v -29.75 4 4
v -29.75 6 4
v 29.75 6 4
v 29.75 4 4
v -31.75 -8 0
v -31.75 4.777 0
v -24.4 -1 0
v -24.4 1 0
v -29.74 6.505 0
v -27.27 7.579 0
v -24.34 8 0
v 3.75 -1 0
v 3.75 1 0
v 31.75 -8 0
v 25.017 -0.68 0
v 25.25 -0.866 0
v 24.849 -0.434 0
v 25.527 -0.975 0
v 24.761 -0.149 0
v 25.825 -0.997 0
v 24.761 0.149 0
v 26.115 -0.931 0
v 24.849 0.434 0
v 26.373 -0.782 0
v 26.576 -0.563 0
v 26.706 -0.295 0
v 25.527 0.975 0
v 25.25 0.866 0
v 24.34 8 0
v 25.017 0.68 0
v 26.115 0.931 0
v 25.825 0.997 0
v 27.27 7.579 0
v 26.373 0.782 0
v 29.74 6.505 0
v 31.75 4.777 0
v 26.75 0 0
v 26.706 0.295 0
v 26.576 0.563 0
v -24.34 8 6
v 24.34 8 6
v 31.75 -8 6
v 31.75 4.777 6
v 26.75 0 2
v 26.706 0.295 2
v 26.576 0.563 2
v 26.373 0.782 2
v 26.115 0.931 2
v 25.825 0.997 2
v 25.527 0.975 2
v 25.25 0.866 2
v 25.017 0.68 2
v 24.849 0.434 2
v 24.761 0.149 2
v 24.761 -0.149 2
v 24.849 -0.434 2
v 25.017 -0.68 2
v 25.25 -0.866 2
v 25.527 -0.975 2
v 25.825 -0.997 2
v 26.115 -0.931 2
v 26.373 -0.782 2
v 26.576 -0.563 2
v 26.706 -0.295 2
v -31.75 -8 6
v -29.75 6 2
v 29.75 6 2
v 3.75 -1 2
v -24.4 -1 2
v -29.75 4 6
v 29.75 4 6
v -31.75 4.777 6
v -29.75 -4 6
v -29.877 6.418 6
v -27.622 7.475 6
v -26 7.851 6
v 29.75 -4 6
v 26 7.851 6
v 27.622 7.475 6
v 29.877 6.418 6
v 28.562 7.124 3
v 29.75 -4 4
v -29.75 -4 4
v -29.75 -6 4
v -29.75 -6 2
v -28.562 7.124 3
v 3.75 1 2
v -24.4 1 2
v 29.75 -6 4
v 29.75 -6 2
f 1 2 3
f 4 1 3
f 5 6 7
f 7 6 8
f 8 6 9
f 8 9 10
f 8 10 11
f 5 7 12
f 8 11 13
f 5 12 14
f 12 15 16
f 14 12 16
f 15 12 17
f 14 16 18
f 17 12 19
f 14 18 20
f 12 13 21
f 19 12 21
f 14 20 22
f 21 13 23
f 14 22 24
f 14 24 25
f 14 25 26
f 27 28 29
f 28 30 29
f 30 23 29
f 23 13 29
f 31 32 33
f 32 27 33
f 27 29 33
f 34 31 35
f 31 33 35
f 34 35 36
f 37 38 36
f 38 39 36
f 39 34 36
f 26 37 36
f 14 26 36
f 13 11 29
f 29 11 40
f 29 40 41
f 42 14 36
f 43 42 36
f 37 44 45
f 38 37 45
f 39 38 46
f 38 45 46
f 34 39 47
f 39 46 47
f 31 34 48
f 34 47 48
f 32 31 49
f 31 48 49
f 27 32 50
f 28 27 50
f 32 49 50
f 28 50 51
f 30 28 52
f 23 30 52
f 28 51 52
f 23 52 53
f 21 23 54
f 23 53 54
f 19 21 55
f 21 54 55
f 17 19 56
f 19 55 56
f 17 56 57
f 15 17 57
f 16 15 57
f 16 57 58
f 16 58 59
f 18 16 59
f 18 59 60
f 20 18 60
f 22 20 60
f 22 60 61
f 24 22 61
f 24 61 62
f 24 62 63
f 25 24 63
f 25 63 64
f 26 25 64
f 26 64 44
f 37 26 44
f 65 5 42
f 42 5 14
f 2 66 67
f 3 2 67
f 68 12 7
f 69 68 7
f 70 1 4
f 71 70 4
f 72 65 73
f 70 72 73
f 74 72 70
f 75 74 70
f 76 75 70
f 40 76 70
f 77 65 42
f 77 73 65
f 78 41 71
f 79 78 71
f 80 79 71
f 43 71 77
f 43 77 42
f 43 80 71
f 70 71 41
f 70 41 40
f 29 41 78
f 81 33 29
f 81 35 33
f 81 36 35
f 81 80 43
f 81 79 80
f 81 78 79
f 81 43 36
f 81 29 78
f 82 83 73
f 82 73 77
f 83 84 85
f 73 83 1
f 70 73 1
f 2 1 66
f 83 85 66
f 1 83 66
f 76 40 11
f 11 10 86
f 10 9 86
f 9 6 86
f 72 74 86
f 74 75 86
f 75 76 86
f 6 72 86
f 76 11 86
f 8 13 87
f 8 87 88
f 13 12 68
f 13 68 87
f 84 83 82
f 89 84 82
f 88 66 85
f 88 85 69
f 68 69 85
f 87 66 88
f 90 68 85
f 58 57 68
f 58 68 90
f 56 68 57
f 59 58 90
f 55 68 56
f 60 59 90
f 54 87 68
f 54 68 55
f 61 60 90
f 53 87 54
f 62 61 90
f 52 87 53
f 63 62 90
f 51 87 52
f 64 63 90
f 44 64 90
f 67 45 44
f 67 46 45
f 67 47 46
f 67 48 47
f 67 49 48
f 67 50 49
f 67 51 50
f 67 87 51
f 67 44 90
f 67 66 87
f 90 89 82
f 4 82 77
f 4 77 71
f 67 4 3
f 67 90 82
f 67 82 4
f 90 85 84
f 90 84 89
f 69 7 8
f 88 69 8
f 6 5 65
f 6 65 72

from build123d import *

# Parameters (mm, degrees)
SKETCH1_W           = 63.5
SKETCH1_H           = 16
BOSS_EXTRUDE1_DEPTH = 2
SKETCH2_W           = 63.5
SKETCH2_H           = 16
SKETCH2_W_2         = 59.5
SKETCH2_H_2         = 12
BOSS_EXTRUDE2_DEPTH = 2
SKETCH4_W           = 63.5
SKETCH4_H           = 16
SKETCH4_W_2         = 59.5
SKETCH4_H_2         = 8
BOSS_EXTRUDE3_DEPTH = 2
SKETCH6_R           = 1
CUT_EXTRUDE2_DEPTH  = 33.985792396
SKETCH7_W           = 28.15
SKETCH7_H           = 2
CUT_EXTRUDE3_DEPTH  = 34.287572756
CUT_EXTRUDE4_DEPTH  = 34.287572756


with BuildPart() as part:
    # Sketch1 → Boss-Extrude1 (new body)
    with BuildSketch(Plane.XY):
        Rectangle(SKETCH1_W, SKETCH1_H)
    extrude(amount=BOSS_EXTRUDE1_DEPTH)

    # Sketch2 → Boss-Extrude2 (add)
    with BuildSketch(Plane.XY.offset(2)):
        Rectangle(SKETCH2_W, SKETCH2_H)
        Rectangle(SKETCH2_W_2, SKETCH2_H_2, mode=Mode.SUBTRACT)
    extrude(amount=BOSS_EXTRUDE2_DEPTH)

    # Sketch4 → Boss-Extrude3 (add)
    with BuildSketch(Plane.XY.offset(4)):
        Rectangle(SKETCH4_W, SKETCH4_H)
        Rectangle(SKETCH4_W_2, SKETCH4_H_2, mode=Mode.SUBTRACT)
    extrude(amount=BOSS_EXTRUDE3_DEPTH)

    # Sketch6 → Cut-Extrude2 (cut, through all)
    with BuildSketch(Plane.XY.offset(2)):
        with Locations((25.75, 0)):
            Circle(SKETCH6_R)
    extrude(amount=-CUT_EXTRUDE2_DEPTH, mode=Mode.SUBTRACT)

    # Sketch7 → Cut-Extrude3 (cut, through all)
    with BuildSketch(Plane(origin=(0, 0, 0), x_dir=(-1, 0, 0), z_dir=(0, 0, -1))):
        with Locations((10.325, 0)):
            Rectangle(SKETCH7_W, SKETCH7_H)
    extrude(amount=-CUT_EXTRUDE3_DEPTH, mode=Mode.SUBTRACT)

    # Sketch8 → Cut-Extrude4 (cut, through all)
    with BuildSketch(Plane(origin=(0, 0, 0), x_dir=(-1, 0, 0), z_dir=(0, 0, -1))):
        with BuildLine():
            add(Edge.make_bspline(
                [(24.340057871, 8), (29.079374102, 7.859454073), (31.75, 4.777235297)],
                knots=[0.087220719, 0.087220719, 0.087220719, 1, 1, 1], degree=2))
            Line((31.75, 4.777235297), (31.75, 8))
            Line((31.75, 8), (24.340057871, 8))
        make_face()
    cut_extrude4 = extrude(amount=-CUT_EXTRUDE4_DEPTH, mode=Mode.SUBTRACT)

    # Mirror1: Cut-Extrude4 across plane
    add(cut_extrude4.mirror(Plane(origin=(0, 0, 0), x_dir=(0, 0, 1), z_dir=(1, 0, 0))), mode=Mode.SUBTRACT)


solid = part.part
